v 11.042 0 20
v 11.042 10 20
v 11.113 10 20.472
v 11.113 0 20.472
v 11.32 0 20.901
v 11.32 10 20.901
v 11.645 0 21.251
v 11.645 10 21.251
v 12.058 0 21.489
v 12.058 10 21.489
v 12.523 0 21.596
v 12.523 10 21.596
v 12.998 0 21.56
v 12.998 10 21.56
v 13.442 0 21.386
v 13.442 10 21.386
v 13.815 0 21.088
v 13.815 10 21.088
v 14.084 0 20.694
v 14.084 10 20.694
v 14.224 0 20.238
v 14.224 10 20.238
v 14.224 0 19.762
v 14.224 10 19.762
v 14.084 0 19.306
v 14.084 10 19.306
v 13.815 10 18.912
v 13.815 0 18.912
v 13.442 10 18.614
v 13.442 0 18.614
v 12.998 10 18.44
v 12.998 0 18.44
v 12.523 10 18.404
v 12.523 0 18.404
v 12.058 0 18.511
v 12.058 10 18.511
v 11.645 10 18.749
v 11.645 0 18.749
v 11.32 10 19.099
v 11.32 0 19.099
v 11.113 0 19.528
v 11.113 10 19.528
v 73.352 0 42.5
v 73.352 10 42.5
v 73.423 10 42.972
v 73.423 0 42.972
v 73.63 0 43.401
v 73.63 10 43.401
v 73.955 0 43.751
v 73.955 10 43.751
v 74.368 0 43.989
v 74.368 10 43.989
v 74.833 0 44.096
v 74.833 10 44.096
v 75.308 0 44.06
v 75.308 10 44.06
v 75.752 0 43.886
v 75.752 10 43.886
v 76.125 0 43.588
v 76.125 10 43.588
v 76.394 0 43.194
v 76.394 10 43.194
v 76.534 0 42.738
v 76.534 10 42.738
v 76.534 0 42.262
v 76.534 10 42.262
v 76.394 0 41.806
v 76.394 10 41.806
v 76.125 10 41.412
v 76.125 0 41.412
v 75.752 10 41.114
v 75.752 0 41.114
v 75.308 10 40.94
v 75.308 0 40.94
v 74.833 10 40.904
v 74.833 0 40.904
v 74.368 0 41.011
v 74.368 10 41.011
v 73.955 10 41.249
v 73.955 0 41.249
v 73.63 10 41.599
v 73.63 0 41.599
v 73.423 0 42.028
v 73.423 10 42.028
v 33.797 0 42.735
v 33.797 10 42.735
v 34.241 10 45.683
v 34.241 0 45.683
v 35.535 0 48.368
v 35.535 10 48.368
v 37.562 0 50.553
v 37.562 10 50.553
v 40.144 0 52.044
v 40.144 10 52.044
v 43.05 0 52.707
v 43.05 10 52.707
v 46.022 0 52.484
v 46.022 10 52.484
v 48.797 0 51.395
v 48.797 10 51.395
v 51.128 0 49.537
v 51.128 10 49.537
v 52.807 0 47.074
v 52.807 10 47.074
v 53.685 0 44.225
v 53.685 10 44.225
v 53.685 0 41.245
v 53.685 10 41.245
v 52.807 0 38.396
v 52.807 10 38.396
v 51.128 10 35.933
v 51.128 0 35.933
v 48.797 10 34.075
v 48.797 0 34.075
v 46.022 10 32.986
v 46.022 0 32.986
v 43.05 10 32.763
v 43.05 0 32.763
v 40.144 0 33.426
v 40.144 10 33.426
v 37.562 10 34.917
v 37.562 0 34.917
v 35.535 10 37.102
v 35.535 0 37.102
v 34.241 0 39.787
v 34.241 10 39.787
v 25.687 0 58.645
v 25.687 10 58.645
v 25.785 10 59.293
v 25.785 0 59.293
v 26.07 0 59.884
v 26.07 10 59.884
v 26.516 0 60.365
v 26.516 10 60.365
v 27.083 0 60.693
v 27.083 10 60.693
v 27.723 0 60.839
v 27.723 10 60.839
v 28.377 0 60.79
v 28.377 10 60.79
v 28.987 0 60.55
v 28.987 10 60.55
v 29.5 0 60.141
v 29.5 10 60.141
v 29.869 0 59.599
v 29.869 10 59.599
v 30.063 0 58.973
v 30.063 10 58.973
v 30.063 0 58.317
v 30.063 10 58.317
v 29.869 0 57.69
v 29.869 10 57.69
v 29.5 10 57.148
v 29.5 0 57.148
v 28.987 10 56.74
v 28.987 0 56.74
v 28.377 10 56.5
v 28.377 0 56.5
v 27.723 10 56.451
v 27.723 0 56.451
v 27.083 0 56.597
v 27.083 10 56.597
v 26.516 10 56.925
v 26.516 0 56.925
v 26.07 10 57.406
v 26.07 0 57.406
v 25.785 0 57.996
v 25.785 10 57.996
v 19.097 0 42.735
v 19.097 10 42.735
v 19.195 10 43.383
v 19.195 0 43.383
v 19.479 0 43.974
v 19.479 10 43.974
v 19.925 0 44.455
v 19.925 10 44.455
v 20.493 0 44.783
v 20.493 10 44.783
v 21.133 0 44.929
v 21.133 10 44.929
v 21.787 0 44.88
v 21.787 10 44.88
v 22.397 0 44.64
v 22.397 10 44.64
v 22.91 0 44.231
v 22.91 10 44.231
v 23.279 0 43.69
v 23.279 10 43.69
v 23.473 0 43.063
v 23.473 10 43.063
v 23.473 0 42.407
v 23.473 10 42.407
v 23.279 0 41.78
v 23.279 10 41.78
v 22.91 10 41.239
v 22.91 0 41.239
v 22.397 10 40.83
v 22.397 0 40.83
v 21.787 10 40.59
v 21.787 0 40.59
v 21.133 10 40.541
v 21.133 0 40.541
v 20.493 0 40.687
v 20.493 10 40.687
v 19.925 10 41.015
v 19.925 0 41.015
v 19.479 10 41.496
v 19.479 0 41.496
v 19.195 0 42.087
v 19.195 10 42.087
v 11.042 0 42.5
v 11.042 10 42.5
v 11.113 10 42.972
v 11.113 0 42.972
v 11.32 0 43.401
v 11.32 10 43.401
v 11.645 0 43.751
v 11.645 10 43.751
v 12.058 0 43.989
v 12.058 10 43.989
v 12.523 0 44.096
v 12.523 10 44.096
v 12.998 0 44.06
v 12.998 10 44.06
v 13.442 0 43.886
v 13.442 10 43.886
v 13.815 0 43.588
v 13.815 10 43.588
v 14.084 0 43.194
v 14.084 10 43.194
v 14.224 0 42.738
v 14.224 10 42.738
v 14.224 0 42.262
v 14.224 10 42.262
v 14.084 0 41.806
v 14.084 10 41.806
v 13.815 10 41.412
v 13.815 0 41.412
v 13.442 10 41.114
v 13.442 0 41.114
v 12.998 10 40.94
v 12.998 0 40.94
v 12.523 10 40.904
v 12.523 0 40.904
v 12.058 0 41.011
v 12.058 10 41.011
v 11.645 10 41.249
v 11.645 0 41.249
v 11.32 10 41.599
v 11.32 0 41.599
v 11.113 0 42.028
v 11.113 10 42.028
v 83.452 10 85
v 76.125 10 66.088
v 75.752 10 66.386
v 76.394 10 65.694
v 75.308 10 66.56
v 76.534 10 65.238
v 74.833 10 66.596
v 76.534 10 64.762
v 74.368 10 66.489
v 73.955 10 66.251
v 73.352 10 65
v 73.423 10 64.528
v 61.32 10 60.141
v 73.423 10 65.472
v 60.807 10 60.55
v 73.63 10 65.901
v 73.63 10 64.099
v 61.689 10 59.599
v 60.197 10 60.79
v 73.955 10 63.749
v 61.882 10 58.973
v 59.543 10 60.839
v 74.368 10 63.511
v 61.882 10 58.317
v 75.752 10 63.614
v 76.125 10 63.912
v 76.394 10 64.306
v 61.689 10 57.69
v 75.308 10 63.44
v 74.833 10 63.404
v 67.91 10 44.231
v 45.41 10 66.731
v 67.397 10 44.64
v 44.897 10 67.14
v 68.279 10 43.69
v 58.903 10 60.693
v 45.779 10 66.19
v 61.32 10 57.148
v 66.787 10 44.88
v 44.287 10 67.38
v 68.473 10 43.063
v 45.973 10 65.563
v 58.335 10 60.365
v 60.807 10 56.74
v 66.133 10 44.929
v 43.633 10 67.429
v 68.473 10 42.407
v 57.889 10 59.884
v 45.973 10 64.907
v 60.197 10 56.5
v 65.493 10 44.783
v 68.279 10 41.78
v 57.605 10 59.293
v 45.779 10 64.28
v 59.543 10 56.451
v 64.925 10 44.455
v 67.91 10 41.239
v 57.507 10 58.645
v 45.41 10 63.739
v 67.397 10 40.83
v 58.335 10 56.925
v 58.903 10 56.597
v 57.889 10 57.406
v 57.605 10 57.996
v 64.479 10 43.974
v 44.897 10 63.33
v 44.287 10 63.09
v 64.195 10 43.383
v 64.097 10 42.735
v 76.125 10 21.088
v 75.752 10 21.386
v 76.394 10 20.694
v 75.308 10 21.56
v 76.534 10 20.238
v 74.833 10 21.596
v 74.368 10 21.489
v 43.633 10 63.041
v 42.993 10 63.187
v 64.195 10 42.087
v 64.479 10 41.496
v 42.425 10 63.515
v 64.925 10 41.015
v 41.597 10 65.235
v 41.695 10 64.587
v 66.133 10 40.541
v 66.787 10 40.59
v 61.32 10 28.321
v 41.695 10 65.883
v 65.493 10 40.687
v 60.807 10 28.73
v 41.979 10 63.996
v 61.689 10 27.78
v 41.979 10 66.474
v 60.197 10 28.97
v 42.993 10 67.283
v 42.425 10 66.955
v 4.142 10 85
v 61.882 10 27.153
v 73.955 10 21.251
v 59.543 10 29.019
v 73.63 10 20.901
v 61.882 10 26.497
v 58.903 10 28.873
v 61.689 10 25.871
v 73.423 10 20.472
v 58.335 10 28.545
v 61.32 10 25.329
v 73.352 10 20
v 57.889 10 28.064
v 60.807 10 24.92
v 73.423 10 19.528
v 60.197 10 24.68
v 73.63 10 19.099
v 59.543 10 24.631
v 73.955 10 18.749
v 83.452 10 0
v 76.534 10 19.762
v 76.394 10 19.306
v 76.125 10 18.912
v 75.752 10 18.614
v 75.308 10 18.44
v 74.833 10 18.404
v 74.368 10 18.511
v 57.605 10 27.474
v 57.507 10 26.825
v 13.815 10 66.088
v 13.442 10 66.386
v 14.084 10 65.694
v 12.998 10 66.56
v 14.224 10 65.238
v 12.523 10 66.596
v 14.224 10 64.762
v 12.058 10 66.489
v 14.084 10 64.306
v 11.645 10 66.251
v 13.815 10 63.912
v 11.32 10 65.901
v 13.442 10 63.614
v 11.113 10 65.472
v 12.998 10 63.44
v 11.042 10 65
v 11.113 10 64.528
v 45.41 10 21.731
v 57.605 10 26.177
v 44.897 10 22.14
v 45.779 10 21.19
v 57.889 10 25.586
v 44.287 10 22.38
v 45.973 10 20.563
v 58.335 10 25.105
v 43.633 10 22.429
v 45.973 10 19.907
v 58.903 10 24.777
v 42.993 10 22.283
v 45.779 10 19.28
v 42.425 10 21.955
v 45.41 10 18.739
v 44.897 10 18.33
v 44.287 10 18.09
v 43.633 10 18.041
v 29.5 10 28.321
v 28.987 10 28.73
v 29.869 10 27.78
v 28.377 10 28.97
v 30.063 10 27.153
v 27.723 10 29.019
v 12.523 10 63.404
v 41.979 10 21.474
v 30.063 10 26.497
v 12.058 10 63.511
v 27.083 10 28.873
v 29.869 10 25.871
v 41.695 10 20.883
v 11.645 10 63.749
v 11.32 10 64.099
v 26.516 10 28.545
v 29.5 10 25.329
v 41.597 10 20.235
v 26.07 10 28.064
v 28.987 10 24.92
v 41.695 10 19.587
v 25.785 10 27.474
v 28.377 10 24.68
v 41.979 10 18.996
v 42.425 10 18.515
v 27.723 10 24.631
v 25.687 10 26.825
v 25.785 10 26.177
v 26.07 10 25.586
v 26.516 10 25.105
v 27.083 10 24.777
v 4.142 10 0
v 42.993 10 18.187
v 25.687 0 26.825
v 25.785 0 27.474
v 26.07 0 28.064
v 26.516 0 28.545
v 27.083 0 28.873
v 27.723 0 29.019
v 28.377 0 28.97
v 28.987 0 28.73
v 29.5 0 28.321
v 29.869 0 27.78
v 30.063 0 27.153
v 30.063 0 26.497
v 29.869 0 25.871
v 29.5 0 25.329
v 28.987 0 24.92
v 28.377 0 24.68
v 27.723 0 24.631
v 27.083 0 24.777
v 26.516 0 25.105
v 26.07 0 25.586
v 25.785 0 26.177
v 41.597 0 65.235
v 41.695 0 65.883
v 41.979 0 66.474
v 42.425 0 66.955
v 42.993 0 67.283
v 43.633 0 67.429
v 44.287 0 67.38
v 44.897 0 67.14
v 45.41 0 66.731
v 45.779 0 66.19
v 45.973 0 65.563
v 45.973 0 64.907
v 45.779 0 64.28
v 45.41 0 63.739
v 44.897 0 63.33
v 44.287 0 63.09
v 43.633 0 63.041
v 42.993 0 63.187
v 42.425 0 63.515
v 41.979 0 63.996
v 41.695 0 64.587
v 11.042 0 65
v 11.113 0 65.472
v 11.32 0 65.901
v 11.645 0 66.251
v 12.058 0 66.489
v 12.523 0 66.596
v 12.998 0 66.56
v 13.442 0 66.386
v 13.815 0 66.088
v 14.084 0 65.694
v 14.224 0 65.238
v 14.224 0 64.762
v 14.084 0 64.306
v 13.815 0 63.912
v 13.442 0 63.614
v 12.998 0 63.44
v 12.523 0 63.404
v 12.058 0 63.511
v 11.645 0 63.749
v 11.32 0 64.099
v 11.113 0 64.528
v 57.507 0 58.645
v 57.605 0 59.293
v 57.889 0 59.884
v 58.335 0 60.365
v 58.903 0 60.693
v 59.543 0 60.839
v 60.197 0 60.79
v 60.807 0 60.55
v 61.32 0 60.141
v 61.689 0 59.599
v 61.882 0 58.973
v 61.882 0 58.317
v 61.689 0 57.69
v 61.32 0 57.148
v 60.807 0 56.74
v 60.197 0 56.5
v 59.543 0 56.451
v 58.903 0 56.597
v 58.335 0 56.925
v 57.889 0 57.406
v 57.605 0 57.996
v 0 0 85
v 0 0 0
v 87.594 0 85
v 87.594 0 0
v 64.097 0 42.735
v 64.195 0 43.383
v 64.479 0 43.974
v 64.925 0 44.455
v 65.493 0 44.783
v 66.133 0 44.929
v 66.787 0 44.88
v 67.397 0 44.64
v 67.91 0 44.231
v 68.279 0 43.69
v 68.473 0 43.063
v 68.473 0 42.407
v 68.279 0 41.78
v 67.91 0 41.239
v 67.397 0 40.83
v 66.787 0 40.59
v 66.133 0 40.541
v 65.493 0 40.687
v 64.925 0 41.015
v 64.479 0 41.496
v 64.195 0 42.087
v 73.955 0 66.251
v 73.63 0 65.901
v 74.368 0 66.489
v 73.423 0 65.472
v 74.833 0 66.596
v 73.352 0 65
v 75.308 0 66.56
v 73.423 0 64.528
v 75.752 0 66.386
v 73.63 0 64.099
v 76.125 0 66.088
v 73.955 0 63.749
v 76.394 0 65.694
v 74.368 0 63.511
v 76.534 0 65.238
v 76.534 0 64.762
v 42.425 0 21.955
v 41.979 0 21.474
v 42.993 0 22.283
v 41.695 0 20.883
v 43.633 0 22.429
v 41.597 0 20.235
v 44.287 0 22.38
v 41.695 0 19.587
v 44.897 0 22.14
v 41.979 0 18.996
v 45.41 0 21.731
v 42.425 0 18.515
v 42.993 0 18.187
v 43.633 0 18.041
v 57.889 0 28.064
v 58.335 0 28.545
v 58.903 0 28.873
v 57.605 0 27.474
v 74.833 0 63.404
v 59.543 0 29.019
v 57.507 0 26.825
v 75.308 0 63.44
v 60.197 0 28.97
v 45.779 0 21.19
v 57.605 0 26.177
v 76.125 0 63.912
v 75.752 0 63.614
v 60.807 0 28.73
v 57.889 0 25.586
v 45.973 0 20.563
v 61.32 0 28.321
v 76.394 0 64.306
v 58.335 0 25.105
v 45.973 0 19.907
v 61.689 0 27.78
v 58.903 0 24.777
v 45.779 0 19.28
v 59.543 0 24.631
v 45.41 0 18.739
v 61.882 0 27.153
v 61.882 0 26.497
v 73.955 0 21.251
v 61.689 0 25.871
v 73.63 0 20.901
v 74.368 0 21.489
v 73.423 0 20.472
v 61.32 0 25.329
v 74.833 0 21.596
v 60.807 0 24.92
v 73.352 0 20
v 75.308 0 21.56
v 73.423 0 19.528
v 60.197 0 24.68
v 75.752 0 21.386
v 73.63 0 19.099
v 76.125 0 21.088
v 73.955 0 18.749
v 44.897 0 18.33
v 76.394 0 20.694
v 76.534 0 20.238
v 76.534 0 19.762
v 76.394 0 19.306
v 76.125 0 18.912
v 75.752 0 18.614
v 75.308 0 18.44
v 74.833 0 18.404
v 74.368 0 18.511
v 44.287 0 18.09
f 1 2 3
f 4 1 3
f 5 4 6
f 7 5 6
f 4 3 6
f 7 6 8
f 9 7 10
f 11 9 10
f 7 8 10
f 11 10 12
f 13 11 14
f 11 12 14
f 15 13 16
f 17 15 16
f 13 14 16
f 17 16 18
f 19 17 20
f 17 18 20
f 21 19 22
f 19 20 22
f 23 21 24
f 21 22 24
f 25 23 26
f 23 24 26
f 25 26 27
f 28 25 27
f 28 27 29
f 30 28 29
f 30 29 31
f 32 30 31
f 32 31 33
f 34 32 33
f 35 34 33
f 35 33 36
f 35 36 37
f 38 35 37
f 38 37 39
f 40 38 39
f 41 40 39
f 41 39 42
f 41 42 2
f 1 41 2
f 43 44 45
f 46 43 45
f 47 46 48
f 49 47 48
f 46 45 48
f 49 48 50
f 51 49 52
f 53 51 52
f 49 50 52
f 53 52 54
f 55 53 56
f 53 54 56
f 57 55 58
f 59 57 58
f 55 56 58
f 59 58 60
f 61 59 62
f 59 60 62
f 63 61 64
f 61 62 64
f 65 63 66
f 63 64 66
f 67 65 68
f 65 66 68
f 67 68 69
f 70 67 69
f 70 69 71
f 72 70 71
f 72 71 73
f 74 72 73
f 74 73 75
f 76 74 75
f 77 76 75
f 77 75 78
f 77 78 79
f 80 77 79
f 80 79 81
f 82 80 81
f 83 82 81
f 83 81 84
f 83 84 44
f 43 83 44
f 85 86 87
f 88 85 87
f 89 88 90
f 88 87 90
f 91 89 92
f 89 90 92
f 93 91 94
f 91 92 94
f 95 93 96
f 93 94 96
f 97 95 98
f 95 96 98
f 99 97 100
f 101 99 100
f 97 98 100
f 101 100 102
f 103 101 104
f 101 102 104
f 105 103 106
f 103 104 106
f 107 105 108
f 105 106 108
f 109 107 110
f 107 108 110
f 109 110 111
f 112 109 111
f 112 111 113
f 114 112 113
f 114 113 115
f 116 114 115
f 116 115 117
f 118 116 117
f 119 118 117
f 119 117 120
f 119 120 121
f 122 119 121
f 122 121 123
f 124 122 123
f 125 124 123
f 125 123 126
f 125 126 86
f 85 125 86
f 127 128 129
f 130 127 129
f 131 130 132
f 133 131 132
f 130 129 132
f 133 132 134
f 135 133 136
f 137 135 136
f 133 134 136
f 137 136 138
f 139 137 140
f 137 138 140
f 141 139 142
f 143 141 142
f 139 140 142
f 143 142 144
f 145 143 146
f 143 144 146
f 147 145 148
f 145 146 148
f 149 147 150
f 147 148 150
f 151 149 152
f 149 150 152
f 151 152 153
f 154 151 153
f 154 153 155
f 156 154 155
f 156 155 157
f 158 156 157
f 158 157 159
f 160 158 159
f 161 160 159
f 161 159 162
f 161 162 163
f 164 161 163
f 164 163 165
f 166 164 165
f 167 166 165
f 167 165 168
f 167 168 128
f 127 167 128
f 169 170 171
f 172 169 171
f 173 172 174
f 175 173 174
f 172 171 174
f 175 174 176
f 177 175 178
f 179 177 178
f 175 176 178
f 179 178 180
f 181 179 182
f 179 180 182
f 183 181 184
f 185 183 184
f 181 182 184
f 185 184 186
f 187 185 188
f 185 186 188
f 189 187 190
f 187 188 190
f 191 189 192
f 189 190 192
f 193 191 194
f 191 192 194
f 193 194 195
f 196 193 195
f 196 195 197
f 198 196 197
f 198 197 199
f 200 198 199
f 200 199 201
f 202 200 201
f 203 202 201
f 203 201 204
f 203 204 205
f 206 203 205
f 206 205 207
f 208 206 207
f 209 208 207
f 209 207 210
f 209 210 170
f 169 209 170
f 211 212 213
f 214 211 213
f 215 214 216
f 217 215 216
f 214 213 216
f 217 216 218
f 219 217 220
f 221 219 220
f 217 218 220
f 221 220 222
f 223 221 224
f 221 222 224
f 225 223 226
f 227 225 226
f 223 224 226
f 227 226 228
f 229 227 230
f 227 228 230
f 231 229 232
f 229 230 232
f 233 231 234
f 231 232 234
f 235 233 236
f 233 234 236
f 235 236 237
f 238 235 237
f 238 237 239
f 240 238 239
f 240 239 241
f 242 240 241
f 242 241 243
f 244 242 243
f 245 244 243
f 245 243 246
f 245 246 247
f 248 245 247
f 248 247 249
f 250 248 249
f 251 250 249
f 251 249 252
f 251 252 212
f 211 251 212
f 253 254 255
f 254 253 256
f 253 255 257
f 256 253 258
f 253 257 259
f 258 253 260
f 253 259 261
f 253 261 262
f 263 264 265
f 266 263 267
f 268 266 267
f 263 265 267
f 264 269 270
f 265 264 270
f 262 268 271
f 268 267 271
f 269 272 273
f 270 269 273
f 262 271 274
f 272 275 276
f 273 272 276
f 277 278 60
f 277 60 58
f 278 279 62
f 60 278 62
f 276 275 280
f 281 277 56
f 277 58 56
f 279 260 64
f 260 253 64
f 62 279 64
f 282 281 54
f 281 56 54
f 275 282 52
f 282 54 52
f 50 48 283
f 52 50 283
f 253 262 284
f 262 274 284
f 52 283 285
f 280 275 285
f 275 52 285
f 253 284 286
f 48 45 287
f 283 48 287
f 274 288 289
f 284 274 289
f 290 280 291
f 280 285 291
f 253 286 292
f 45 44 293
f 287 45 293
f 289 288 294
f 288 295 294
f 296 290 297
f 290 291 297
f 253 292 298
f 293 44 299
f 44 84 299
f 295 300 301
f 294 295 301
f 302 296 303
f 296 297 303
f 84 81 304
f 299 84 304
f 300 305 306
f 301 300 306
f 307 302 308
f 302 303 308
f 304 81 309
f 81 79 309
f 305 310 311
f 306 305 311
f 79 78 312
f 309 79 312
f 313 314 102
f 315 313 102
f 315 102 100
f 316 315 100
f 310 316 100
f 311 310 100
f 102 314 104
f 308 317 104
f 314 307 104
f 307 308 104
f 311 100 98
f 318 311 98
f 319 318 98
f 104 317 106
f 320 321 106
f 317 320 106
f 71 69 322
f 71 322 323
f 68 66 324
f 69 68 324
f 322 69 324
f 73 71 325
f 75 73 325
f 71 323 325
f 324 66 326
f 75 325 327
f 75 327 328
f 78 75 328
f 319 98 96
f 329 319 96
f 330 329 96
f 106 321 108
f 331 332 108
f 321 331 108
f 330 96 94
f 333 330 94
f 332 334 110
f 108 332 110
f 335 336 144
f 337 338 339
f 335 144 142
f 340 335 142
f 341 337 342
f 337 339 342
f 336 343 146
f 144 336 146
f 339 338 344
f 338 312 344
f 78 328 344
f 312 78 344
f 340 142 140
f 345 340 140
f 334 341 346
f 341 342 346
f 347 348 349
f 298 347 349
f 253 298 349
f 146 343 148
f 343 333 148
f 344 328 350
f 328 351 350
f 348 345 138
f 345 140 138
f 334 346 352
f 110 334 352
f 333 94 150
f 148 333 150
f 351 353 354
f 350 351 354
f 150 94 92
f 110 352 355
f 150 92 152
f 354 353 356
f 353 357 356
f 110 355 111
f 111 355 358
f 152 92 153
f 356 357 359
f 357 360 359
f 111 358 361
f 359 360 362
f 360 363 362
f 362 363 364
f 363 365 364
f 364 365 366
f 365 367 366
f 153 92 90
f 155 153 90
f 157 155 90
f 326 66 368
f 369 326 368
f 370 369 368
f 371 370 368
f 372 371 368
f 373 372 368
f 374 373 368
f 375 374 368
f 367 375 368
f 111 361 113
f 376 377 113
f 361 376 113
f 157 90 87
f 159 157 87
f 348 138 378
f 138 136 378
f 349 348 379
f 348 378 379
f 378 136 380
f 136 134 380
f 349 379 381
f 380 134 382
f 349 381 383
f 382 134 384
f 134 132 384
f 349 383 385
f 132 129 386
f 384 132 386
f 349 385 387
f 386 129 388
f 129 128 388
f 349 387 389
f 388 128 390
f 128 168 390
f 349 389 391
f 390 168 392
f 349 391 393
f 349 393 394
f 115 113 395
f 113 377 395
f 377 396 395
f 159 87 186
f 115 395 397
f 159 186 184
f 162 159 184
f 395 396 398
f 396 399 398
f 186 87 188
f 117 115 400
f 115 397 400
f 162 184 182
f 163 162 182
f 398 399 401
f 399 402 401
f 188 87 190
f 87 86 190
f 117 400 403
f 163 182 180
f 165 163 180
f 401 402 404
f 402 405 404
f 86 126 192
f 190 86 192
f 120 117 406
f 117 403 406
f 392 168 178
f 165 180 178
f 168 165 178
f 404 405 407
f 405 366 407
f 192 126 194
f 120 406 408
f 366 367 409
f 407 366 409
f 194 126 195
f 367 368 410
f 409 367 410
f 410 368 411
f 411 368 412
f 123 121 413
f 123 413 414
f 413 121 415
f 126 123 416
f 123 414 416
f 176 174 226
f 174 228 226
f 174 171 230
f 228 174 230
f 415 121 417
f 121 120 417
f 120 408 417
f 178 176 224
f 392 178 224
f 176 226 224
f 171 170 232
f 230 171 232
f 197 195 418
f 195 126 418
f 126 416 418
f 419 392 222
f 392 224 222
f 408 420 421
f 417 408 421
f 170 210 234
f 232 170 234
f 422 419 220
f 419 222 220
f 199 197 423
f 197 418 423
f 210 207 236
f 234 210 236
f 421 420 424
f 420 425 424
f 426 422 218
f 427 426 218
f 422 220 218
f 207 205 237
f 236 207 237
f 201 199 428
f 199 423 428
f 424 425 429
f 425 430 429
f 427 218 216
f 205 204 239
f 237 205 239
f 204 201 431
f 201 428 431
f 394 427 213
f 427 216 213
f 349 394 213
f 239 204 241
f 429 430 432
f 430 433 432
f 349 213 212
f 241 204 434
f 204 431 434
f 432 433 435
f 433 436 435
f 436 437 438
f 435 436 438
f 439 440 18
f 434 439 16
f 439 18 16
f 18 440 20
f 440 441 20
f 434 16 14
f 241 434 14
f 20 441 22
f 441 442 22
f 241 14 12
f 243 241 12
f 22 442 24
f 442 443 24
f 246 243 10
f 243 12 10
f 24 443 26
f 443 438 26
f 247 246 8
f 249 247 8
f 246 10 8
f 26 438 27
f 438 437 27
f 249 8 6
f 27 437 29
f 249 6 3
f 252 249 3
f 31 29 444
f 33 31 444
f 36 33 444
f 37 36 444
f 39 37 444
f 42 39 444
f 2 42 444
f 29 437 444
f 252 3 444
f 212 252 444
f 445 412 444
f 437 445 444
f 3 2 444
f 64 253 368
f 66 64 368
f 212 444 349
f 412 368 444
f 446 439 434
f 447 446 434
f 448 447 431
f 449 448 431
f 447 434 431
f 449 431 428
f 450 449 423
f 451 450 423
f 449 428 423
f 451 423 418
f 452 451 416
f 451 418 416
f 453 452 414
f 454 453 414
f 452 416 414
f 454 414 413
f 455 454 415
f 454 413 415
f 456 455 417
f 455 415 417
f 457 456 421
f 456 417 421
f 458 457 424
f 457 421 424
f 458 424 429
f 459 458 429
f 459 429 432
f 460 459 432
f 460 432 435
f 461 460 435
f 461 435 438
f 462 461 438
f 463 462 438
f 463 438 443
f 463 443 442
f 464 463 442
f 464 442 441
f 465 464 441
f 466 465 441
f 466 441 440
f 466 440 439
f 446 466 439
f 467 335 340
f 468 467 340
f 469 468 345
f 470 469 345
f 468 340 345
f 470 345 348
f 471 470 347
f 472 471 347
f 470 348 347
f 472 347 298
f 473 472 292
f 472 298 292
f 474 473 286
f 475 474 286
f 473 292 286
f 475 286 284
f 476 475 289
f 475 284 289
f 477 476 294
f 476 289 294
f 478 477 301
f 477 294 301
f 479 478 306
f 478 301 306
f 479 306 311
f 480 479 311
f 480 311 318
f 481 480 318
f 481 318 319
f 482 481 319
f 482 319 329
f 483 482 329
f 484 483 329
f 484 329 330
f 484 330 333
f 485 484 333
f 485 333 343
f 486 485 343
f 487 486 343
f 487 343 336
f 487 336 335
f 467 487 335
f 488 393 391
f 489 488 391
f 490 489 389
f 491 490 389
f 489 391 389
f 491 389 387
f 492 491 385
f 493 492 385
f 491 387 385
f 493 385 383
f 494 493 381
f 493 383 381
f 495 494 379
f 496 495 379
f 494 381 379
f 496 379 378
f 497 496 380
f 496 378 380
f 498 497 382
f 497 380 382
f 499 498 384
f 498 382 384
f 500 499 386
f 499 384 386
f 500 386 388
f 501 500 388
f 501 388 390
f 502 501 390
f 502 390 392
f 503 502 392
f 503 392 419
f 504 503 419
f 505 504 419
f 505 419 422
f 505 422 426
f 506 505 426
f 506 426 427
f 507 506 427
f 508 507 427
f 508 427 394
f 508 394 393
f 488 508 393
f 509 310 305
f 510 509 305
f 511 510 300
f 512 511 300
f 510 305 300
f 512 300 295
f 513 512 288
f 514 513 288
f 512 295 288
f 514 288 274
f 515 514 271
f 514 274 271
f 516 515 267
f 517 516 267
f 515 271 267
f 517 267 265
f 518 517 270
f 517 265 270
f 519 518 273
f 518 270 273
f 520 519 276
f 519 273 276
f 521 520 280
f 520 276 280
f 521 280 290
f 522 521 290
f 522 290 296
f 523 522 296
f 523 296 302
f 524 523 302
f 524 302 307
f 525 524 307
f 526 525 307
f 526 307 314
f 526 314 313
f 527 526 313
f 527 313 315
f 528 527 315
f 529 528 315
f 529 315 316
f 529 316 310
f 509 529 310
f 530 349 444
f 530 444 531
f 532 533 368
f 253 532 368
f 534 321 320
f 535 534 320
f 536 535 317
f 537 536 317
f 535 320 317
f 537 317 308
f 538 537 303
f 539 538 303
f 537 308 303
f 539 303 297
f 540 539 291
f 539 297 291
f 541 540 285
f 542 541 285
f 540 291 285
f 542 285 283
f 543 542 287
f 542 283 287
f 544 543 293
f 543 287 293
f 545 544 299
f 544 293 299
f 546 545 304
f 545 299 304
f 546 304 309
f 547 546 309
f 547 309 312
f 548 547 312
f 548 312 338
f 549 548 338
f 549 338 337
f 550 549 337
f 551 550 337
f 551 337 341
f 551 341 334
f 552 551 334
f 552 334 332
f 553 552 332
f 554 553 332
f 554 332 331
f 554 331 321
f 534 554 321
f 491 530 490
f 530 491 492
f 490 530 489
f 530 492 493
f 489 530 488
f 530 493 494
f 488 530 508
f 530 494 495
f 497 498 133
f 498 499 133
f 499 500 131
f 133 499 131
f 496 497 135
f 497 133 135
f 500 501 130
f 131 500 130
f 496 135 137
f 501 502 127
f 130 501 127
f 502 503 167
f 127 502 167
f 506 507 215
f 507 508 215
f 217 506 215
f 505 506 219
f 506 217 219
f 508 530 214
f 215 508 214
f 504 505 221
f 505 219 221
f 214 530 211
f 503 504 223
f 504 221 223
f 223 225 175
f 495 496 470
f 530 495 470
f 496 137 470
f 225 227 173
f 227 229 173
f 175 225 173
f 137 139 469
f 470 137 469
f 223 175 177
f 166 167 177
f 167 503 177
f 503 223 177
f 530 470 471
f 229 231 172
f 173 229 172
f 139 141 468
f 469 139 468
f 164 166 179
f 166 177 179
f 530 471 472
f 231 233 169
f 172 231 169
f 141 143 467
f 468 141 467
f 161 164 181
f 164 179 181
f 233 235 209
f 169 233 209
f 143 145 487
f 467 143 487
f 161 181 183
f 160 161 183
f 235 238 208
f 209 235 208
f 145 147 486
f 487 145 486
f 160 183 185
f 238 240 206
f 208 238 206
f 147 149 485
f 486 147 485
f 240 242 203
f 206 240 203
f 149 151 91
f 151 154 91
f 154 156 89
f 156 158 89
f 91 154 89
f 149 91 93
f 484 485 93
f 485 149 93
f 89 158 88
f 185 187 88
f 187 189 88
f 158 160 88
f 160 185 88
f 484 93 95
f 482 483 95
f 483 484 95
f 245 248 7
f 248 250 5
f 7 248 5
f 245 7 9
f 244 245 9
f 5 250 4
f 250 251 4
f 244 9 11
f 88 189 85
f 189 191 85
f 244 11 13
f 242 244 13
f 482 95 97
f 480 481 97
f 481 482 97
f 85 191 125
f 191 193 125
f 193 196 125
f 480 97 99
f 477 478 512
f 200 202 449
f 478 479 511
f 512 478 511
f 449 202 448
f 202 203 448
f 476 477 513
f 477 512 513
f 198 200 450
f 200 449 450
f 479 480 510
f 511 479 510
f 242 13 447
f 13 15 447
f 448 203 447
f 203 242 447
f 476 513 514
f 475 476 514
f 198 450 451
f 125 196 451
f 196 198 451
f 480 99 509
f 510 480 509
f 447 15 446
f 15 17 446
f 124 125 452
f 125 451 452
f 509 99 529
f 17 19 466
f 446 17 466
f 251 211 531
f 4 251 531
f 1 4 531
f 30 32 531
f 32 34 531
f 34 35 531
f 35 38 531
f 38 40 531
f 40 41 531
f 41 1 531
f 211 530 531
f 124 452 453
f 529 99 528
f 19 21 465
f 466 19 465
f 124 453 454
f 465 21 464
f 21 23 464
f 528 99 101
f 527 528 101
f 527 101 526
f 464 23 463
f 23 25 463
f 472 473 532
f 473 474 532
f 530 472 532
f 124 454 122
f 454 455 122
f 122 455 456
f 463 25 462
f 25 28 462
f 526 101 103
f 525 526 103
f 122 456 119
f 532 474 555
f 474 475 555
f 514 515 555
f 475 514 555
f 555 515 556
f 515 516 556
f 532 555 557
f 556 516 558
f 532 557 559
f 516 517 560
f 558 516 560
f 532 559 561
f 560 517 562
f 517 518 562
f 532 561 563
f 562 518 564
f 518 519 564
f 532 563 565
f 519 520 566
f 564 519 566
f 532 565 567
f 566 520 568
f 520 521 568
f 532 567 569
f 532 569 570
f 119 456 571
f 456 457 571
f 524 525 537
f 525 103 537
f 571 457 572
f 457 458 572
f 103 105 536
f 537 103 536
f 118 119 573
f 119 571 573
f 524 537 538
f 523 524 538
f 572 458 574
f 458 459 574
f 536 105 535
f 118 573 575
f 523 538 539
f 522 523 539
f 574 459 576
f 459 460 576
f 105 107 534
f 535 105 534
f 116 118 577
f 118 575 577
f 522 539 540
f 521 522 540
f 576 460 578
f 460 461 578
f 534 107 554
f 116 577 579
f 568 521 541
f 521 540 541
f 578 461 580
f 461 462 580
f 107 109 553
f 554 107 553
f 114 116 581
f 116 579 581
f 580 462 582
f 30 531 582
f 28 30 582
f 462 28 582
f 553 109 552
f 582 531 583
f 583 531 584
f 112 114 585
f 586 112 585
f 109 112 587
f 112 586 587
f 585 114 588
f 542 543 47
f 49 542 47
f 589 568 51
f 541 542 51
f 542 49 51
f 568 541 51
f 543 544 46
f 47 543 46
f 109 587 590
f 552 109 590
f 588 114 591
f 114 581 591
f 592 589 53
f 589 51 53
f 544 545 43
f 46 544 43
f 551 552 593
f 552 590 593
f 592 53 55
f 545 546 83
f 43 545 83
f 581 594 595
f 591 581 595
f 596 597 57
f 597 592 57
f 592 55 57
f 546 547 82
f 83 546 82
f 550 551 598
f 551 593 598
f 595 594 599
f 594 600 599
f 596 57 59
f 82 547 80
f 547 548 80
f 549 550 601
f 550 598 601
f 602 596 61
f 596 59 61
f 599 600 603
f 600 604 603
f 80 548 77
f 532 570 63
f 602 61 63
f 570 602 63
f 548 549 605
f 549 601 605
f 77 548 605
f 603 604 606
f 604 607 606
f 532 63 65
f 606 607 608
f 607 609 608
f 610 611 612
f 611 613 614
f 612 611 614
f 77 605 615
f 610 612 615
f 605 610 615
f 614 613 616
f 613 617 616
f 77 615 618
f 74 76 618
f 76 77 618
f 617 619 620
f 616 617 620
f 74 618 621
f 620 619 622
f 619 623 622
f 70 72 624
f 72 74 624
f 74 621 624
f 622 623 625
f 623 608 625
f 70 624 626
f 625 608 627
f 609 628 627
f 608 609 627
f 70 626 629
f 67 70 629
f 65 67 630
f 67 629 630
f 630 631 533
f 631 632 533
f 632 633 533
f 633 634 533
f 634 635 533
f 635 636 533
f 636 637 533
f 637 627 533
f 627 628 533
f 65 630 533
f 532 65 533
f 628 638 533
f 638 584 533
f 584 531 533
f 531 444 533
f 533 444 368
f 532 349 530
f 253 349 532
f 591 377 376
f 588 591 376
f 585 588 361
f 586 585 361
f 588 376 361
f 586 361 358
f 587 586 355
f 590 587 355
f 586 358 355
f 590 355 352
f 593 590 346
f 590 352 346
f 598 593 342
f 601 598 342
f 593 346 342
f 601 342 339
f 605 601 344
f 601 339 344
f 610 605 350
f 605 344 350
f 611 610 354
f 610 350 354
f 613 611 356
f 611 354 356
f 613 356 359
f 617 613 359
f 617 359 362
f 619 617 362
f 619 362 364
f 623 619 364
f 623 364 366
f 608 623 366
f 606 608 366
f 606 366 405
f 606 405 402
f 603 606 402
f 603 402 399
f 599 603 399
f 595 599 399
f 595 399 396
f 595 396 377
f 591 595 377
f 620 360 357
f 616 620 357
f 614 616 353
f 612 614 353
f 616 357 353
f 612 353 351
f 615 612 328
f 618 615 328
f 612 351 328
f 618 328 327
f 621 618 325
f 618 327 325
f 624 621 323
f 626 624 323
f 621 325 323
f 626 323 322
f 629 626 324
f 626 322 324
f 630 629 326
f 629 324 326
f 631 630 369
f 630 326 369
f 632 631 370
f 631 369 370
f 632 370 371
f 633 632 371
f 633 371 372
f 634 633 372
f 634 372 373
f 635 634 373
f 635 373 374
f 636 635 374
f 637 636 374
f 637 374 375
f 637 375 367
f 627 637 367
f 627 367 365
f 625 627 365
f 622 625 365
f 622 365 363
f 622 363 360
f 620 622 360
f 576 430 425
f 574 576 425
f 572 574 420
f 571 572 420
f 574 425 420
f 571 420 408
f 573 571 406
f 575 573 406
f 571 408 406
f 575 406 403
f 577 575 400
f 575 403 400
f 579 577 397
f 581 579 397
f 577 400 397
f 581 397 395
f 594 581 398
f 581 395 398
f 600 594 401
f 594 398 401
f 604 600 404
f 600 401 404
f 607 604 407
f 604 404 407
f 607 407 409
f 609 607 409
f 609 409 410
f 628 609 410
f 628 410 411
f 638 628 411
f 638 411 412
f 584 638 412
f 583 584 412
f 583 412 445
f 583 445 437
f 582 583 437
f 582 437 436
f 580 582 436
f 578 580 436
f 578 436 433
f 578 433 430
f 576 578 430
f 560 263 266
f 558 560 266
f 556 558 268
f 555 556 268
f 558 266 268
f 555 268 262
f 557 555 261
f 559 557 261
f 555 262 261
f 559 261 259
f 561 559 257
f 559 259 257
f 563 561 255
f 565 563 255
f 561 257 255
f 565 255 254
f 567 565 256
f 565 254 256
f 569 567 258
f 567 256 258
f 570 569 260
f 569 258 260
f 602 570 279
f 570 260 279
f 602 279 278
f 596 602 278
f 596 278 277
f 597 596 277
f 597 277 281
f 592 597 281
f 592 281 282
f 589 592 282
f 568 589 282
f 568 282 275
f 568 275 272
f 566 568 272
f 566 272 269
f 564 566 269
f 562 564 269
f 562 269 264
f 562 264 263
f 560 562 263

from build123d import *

# Parameters (mm, degrees)
BOSS_EXTRUDE1_DEPTH = 85
SKETCH3_R           = 10
SKETCH3_R_2         = 2.2
CUT_EXTRUDE1_DEPTH  = 85
SKETCH4_R           = 1.6
CUT_EXTRUDE2_DEPTH  = 85


with BuildPart() as part:
    # Sketch2 → Boss-Extrude1 (new body)
    with BuildSketch(Plane.XY):
        Polygon((0, 0), (87.594271247, 0), (83.452135624, 10), (4.142135624, 10), align=None)
    extrude(amount=BOSS_EXTRUDE1_DEPTH)

    # Sketch3 → Cut-Extrude1 (cut)
    with BuildSketch(Plane(origin=(0, 10, 0), x_dir=(1, 0, 0), z_dir=(0, 1, 0))):
        with Locations(Location((43.797135624, -42.734969619, 0), (0, 0, 180))):
            Circle(SKETCH3_R)
        with Locations(Location((43.797135624, -20.234969619, 0), (0, 0, 180))):
            Circle(SKETCH3_R_2)
        with Locations(Location((59.7070382, -26.825067042, 0), (0, 0, 180))):
            Circle(SKETCH3_R_2)
        with Locations(Location((66.297135624, -42.734969619, 0), (0, 0, 180))):
            Circle(SKETCH3_R_2)
        with Locations(Location((59.7070382, -58.644872196, 0), (0, 0, 180))):
            Circle(SKETCH3_R_2)
        with Locations(Location((43.797135624, -65.234969619, 0), (0, 0, 180))):
            Circle(SKETCH3_R_2)
        with Locations(Location((27.887233047, -58.644872196, 0), (0, 0, 180))):
            Circle(SKETCH3_R_2)
        with Locations(Location((21.297135624, -42.734969619, 0), (0, 0, 180))):
            Circle(SKETCH3_R_2)
        with Locations(Location((27.887233047, -26.825067042, 0), (0, 0, 180))):
            Circle(SKETCH3_R_2)
    extrude(amount=-CUT_EXTRUDE1_DEPTH, mode=Mode.SUBTRACT)

    # Sketch4 → Cut-Extrude2 (cut)
    with BuildSketch(Plane(origin=(0, 10, 0), x_dir=(1, 0, 0), z_dir=(0, 1, 0))):
        with Locations(Location((12.642135624, -20, 0), (0, 0, 180))):
            Circle(SKETCH4_R)
        with Locations(Location((12.642135624, -42.5, 0), (0, 0, 180))):
            Circle(SKETCH4_R)
        with Locations(Location((12.642135624, -65, 0), (0, 0, 180))):
            Circle(SKETCH4_R)
        with Locations(Location((74.952135624, -65, 0), (0, 0, 180))):
            Circle(SKETCH4_R)
        with Locations(Location((74.952135624, -42.5, 0), (0, 0, 180))):
            Circle(SKETCH4_R)
        with Locations(Location((74.952135624, -20, 0), (0, 0, 180))):
            Circle(SKETCH4_R)
    extrude(amount=-CUT_EXTRUDE2_DEPTH, mode=Mode.SUBTRACT)


solid = part.part
